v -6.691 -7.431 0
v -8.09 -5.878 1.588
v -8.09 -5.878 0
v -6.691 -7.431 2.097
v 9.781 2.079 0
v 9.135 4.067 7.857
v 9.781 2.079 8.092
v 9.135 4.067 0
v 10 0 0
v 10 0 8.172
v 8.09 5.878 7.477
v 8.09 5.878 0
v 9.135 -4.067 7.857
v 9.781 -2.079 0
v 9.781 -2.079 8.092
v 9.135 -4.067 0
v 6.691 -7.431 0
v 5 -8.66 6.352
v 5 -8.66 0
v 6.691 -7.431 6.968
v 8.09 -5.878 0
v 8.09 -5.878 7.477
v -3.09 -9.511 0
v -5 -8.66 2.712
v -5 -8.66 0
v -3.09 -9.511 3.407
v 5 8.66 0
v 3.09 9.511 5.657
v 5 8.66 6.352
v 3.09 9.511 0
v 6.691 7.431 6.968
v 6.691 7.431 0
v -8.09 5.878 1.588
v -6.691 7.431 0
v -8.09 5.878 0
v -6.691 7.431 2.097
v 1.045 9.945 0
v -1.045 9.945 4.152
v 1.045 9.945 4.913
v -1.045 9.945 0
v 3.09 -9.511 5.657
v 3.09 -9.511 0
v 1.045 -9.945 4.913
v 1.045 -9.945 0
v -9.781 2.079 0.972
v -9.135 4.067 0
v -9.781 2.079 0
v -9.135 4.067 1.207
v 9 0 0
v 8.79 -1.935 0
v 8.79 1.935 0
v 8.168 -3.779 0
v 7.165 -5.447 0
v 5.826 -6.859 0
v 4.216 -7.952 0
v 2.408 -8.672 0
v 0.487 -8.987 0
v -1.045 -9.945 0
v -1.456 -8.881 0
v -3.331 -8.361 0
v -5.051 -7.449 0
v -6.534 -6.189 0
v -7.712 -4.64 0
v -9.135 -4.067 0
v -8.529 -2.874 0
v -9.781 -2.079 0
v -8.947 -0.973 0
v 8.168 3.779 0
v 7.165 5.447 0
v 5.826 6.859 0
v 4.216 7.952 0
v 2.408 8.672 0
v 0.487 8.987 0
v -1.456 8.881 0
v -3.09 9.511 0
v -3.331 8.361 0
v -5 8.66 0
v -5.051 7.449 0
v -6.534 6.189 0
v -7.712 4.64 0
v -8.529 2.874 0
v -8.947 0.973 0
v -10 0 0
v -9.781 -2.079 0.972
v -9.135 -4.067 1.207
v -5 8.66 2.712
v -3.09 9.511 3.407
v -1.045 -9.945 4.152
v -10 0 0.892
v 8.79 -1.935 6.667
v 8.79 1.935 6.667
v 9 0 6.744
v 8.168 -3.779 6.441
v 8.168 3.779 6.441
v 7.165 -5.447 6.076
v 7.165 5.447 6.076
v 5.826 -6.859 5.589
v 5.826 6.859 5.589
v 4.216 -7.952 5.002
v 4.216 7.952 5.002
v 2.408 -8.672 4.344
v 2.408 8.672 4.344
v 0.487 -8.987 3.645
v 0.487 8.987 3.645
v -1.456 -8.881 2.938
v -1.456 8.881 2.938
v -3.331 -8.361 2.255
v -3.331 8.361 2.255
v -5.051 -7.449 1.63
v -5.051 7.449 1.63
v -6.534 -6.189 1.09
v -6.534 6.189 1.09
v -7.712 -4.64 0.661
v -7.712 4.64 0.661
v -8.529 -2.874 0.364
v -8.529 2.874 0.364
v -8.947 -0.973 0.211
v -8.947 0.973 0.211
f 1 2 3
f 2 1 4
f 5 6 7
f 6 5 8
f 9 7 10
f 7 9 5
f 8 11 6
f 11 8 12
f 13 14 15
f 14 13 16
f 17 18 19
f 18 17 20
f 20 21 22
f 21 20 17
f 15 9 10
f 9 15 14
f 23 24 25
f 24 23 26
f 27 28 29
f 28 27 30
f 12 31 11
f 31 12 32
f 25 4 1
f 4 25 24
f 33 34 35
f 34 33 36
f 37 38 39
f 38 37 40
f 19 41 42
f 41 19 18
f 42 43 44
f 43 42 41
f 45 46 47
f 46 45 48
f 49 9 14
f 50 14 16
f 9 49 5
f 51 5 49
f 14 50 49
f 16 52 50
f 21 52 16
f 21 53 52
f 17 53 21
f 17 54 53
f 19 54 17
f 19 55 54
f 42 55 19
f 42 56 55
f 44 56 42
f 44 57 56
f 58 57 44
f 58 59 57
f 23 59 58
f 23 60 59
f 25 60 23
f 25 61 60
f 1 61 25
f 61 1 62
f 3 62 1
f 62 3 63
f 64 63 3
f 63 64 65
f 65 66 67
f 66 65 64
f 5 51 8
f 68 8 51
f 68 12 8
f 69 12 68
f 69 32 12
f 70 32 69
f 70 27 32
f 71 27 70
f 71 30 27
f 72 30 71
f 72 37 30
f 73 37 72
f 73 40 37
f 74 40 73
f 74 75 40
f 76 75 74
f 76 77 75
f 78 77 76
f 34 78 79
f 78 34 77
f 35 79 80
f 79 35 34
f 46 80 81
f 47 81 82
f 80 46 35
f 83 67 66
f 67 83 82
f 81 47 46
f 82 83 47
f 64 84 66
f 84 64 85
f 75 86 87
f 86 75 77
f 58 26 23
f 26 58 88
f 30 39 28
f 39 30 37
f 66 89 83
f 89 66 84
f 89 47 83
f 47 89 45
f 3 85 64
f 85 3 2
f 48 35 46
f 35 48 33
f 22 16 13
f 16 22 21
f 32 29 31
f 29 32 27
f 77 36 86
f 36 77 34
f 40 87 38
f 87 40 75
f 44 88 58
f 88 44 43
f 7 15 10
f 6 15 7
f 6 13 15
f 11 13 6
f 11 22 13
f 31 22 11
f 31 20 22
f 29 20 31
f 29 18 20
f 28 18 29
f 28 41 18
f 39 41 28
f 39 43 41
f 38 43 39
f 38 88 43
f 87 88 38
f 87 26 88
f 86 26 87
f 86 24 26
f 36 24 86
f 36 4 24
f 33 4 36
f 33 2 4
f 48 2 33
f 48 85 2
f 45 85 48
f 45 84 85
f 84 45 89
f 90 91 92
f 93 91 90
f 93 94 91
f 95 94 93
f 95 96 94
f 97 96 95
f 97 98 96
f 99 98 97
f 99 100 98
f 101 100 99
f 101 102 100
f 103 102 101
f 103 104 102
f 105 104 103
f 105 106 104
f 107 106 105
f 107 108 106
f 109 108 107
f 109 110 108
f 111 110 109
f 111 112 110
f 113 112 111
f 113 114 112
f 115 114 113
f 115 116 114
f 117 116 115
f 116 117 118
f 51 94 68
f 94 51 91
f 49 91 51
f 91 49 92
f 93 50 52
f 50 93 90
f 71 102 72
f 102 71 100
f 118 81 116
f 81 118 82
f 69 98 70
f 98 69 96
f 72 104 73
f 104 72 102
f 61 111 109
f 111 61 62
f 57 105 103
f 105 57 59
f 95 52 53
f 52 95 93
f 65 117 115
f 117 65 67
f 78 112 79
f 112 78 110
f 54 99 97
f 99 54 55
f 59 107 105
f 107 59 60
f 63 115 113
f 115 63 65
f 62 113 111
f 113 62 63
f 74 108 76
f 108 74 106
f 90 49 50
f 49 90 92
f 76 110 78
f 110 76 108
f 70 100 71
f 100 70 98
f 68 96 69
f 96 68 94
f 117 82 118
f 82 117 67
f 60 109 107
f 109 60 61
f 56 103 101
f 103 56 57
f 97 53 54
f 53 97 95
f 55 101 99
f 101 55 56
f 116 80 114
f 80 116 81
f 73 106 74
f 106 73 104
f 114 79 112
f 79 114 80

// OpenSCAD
// entire shape

union() {

  // top of sliced cylinder
  intersection() {

    cylinder(h = 10, r1 = 10, r2 = 10);

    // rotated plane that slices through a cylinder
    translate([0,0,4]) {
      rotate([0,-20,0]) {
        cube([30, 30, 1], center=true);
      }
    }
  }

  // diagonally sliced cylindrical tube
  difference() {

    // cylindrical tube
    difference() {
      cylinder(h = 10, r1 = 10, r2 = 10);
      translate([0,0,-1]) {
        cylinder(h = 12, r1 = 9, r2 = 9);
      }
    }

    // translated and rotated big cube
    translate([0,0,8.9]) {
      rotate([0,-20,0]) {
        cube([30, 30, 10], center=true);
      }
    }

  }

}
